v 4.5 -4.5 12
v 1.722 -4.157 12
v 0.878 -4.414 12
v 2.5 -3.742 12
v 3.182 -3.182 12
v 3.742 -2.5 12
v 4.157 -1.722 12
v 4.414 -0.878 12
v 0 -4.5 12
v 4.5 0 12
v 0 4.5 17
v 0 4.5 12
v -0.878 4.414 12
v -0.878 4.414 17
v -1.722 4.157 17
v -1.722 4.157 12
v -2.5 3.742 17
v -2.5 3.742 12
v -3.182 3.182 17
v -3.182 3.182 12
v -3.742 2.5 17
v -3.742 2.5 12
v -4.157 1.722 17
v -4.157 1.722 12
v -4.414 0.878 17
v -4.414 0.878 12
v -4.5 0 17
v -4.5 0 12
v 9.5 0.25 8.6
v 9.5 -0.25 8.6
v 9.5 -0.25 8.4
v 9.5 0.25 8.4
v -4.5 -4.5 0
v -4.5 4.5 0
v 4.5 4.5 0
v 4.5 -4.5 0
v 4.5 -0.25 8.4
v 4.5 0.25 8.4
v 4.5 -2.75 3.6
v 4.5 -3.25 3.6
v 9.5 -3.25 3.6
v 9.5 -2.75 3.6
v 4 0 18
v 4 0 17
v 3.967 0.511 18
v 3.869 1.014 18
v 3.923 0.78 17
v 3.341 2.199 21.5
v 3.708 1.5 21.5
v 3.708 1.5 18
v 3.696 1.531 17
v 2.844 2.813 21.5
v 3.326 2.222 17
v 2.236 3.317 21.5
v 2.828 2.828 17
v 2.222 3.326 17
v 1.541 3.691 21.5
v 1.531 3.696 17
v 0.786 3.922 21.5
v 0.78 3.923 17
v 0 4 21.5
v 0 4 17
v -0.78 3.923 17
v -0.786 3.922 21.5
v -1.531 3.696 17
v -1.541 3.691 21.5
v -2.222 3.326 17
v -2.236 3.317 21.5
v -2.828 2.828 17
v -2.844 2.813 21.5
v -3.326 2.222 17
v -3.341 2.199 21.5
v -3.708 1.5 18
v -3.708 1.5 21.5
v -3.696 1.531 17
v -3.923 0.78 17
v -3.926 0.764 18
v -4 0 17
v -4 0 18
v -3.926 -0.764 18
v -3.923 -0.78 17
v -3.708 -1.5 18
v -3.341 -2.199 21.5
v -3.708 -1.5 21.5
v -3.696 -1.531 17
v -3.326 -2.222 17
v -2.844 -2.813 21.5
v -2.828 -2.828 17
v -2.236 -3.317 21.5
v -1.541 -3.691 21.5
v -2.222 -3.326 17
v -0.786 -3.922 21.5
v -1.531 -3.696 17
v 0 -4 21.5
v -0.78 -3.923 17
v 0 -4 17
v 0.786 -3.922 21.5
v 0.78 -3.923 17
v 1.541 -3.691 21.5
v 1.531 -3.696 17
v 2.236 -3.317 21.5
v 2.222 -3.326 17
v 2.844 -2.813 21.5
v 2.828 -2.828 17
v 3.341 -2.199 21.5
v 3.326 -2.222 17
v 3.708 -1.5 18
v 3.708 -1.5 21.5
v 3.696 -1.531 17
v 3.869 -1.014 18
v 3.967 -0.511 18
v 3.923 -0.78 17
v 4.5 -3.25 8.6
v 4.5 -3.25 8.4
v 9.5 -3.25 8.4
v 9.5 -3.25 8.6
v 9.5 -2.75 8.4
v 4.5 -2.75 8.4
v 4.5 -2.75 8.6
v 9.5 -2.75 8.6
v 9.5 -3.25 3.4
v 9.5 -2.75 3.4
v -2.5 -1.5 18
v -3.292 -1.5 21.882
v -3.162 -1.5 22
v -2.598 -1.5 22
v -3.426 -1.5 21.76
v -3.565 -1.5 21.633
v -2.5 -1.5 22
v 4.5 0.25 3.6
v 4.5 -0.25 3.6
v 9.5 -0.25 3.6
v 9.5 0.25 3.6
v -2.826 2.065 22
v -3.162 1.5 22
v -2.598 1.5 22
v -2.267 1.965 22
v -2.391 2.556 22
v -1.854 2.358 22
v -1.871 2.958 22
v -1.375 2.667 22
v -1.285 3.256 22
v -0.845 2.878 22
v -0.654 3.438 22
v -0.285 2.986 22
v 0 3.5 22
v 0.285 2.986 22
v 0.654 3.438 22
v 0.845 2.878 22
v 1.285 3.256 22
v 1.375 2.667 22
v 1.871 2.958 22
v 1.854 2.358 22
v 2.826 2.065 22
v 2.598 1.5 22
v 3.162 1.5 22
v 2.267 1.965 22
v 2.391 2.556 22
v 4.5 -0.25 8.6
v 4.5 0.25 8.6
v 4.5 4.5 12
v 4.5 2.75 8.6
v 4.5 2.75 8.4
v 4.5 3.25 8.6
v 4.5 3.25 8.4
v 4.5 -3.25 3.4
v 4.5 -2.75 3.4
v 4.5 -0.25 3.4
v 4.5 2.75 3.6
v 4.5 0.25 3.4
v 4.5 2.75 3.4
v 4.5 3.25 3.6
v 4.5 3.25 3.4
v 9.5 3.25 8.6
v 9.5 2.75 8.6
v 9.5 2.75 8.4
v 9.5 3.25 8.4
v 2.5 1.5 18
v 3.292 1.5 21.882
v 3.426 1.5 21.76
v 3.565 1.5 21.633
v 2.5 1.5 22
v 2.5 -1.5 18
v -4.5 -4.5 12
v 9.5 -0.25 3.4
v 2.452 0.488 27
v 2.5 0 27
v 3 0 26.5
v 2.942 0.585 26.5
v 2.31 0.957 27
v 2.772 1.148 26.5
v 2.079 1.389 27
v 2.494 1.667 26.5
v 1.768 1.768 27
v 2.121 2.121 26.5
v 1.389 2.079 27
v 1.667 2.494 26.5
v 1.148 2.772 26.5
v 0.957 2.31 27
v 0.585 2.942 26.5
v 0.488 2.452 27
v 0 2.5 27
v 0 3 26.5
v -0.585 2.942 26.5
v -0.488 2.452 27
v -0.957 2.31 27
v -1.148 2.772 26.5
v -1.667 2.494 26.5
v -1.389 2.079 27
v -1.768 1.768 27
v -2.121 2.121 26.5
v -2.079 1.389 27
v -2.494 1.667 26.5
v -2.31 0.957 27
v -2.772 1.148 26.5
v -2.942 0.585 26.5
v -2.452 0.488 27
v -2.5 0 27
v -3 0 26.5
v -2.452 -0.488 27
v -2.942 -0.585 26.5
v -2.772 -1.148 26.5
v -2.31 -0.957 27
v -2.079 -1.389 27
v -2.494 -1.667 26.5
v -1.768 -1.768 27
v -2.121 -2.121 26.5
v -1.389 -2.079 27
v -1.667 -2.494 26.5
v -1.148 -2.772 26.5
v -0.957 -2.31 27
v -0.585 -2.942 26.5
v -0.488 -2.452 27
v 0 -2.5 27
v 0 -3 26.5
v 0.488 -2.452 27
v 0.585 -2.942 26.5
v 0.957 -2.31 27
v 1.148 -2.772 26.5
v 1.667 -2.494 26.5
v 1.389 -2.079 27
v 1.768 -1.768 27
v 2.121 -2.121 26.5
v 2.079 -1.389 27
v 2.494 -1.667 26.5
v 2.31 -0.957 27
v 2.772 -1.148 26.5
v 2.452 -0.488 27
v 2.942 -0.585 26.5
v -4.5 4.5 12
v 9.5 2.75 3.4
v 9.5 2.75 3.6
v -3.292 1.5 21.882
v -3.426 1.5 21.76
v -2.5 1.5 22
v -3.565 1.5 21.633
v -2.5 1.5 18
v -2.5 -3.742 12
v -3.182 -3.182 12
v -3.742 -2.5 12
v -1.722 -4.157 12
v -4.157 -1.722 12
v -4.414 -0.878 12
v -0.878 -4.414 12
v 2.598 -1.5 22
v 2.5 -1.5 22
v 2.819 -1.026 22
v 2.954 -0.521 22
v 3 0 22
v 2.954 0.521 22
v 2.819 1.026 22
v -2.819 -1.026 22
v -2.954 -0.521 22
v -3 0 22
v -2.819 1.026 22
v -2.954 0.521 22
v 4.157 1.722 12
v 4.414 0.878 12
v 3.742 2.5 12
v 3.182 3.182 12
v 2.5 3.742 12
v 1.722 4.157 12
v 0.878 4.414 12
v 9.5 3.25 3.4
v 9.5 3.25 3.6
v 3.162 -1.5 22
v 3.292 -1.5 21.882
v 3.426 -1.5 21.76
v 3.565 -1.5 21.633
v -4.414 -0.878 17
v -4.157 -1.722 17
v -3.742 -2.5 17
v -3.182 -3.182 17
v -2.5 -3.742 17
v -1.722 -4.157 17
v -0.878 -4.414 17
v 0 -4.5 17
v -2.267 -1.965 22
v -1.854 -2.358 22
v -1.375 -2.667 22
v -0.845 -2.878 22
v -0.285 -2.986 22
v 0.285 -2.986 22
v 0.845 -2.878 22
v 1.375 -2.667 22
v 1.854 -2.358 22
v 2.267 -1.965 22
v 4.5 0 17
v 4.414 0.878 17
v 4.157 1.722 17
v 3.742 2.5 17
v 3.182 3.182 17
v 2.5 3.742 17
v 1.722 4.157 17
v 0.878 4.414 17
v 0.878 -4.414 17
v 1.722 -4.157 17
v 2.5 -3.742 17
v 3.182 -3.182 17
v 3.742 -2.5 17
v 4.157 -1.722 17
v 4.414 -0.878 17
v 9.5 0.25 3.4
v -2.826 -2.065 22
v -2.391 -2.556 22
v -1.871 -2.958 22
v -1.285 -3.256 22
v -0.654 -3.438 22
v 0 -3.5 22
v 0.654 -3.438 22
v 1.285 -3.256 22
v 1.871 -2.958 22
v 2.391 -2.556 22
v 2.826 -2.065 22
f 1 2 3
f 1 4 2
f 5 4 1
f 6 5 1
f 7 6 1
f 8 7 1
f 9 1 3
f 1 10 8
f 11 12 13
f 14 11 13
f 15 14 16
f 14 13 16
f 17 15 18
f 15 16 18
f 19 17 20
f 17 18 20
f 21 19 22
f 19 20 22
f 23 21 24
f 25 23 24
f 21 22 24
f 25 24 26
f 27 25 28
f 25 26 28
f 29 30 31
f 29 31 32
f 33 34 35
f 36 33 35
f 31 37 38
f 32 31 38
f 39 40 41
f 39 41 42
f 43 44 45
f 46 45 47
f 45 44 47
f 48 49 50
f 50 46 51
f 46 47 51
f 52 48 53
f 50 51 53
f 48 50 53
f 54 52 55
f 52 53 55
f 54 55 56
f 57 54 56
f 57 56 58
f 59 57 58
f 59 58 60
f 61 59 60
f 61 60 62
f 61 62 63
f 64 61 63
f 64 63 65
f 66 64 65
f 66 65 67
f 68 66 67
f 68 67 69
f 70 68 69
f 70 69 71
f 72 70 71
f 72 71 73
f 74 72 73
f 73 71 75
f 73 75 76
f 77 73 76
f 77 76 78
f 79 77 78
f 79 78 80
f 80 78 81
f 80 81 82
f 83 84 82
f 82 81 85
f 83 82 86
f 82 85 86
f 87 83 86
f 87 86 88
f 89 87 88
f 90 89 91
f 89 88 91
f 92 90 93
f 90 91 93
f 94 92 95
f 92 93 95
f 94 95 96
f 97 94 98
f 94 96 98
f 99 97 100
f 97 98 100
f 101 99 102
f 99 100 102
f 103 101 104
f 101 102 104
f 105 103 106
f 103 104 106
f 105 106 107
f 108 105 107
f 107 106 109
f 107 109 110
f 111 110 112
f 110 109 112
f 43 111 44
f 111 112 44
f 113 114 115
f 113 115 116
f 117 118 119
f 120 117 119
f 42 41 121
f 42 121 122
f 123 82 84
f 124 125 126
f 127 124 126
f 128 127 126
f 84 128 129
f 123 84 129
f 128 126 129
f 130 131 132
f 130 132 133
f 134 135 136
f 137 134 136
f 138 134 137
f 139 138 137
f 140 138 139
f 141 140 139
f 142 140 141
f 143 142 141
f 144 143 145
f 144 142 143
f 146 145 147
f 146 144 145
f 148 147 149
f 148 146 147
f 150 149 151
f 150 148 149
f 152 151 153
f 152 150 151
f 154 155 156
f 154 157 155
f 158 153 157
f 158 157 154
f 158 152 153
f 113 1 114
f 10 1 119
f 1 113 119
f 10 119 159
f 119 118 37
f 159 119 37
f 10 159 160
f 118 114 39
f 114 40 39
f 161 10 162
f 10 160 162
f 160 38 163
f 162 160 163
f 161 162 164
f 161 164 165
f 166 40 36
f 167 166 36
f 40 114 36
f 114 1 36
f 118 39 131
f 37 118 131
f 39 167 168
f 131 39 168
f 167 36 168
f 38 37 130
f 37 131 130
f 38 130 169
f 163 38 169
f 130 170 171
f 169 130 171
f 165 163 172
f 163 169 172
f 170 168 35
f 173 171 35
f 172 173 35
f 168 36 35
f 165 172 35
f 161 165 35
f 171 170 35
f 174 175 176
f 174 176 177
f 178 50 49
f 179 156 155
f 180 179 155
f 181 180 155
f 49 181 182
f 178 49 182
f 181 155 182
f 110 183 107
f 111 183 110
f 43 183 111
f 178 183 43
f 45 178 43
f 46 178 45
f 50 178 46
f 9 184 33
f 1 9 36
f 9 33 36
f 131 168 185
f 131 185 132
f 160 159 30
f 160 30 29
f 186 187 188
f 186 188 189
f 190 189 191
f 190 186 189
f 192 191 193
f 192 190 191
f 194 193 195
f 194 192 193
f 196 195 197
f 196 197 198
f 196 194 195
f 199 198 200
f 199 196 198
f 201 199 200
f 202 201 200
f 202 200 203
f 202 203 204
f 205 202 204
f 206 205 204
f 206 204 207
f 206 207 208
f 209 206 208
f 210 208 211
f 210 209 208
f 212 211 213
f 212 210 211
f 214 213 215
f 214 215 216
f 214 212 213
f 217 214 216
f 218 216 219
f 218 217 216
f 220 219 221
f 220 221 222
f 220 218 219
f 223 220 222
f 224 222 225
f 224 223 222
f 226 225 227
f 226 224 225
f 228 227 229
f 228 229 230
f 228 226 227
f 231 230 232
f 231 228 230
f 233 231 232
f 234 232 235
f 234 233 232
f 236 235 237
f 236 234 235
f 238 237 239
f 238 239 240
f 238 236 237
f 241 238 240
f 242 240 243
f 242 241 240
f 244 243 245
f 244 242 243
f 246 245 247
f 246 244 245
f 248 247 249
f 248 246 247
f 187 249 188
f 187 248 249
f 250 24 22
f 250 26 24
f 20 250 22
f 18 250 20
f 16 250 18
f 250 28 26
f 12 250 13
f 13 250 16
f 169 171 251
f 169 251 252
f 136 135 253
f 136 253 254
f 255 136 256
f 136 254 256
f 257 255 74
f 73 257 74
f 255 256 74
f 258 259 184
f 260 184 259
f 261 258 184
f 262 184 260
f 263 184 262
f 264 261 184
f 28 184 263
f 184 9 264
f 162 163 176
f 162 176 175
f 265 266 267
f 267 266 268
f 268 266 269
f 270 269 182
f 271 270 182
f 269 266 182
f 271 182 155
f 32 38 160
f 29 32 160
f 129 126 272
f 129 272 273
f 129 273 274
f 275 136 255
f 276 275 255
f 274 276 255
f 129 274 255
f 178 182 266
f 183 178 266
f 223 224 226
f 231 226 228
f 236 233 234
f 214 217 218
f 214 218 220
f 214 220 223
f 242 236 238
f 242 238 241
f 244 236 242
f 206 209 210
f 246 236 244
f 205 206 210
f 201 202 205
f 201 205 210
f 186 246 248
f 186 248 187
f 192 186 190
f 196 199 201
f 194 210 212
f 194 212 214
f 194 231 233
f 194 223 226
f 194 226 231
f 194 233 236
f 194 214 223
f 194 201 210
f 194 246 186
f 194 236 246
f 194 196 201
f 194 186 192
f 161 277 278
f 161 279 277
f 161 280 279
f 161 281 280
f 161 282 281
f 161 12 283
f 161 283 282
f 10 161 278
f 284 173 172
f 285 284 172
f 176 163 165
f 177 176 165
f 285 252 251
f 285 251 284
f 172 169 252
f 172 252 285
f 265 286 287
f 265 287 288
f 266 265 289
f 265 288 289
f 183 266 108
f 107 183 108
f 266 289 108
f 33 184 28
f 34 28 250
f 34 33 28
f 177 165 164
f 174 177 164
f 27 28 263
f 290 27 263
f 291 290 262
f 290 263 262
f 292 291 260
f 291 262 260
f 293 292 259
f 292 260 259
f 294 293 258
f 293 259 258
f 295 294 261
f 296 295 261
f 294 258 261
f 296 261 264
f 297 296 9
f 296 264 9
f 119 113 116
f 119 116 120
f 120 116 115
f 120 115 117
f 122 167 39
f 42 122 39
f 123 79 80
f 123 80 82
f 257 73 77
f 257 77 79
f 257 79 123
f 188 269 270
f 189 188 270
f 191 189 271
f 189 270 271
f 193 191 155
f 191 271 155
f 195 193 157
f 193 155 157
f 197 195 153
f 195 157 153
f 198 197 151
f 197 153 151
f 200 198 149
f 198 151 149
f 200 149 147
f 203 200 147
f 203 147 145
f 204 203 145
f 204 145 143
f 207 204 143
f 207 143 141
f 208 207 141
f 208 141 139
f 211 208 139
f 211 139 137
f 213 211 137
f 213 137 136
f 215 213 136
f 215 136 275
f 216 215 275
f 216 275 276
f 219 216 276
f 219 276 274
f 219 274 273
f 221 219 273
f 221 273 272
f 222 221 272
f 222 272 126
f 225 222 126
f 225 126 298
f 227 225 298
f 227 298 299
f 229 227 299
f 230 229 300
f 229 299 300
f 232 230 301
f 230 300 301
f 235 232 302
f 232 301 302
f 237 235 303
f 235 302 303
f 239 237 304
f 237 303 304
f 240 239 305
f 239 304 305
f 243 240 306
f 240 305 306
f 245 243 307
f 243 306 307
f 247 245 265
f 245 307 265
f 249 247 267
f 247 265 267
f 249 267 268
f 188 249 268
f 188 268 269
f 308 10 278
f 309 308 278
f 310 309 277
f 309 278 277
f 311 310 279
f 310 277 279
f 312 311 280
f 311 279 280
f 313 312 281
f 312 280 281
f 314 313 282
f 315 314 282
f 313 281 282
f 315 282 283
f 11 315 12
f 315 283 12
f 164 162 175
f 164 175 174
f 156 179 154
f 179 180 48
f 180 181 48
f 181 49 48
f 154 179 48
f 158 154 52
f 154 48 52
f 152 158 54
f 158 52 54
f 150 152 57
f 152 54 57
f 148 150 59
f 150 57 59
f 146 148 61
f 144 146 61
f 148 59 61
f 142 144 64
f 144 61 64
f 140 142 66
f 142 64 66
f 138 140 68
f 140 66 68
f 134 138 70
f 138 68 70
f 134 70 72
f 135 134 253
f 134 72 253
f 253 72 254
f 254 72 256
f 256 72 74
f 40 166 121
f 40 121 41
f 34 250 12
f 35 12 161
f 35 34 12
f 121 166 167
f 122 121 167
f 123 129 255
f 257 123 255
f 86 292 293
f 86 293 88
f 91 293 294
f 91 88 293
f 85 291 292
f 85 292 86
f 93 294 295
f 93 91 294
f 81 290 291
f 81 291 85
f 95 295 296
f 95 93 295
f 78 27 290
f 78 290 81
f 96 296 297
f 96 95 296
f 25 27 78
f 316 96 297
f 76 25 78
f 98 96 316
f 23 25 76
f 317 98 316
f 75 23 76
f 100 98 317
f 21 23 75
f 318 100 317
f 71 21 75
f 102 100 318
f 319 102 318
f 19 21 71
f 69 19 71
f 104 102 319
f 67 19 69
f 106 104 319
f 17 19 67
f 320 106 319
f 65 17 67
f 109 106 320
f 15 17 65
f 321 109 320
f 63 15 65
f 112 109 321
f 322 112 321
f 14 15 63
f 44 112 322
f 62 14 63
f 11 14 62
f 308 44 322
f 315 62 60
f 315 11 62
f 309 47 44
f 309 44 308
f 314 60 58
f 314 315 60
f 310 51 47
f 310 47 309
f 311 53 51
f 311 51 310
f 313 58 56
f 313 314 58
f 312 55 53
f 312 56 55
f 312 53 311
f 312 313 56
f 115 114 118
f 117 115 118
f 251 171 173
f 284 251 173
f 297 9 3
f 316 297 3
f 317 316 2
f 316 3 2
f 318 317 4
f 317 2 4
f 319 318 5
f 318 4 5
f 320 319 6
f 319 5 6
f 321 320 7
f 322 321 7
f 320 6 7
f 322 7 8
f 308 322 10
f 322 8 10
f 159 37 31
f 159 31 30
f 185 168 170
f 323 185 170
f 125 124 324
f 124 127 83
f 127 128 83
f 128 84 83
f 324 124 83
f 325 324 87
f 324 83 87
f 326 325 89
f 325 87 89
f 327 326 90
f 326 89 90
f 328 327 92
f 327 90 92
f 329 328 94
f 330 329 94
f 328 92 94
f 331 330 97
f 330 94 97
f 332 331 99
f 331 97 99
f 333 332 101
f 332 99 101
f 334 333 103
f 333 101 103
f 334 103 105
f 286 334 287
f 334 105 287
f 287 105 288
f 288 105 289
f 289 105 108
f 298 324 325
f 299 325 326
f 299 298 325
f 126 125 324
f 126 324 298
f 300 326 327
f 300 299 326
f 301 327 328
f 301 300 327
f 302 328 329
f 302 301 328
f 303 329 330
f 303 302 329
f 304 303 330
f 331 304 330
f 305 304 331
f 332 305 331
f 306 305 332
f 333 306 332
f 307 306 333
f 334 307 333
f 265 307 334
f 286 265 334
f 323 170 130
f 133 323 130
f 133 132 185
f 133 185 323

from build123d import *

# Parameters (mm, degrees)
F0_W      = 9
F0_H      = 9
F1_DEPTH  = 12
F3_DEPTH  = 5
F4_R      = 4
F5_DEPTH  = 5
F7_DEPTH  = 4
F8_R      = 3
F9_DEPTH  = 5
F10_W     = 0.5
F10_H     = 0.2
F11_DEPTH = 5
F12_SIZE  = 0.5


with BuildPart() as f1:
    # F0 (on Top) → F1 (new body)
    with BuildSketch(Plane.XY):
        Rectangle(F0_W, F0_H)
    extrude(amount=F1_DEPTH)

    # F2 (on face) → F3 (join)
    with BuildSketch(Plane.XY.offset(12)):
        with BuildLine():
            ThreePointArc((0, -4.5), (3.1819805153, -3.1819805153), (4.5, 0))
            ThreePointArc((4.5, 0), (3.1819805153, 3.1819805153), (0, 4.5))
            ThreePointArc((0, 4.5), (-3.1819805153, 3.1819805153), (-4.5, 0))
            ThreePointArc((-4.5, 0), (-3.1819805153, -3.1819805153), (0, -4.5))
        make_face()
    extrude(amount=F3_DEPTH)

    # F4 (on face) → F5 (join)
    with BuildSketch(Plane.XY.offset(17)):
        Circle(F4_R)
    extrude(amount=F5_DEPTH)

    # F6 (on face) → F7 (cut)
    with BuildSketch(Plane.XY.offset(22)):
        with BuildLine():
            Line((-2.5, 1.5), (-3.7080992435, 1.5))
            ThreePointArc((-3.7080992435, 1.5), (-4, 0), (-3.7080992435, -1.5))
            Line((-3.7080992435, -1.5), (-2.5, -1.5))
            Line((-2.5, -1.5), (-2.5, 1.5))
        make_face()
        with BuildLine():
            ThreePointArc((3.7080992435, -1.5), (3.92634671, -0.7640690498), (4, 0))
            ThreePointArc((4, 0), (3.92634671, 0.7640690498), (3.7080992435, 1.5))
            Line((3.7080992435, 1.5), (2.5, 1.5))
            Line((2.5, 1.5), (2.5, -1.5))
            Line((2.5, -1.5), (3.7080992435, -1.5))
        make_face()
    extrude(amount=-F7_DEPTH, mode=Mode.SUBTRACT)

    # F8 (on face) → F9 (join)
    with BuildSketch(Plane.XY.offset(22)):
        Circle(F8_R)
    extrude(amount=F9_DEPTH)

    # F10 (on face) → F11 (join)
    with BuildSketch(Plane.YZ.offset(4.5)):
        with Locations((-3, 8.5)):
            Rectangle(F10_W, F10_H)
        with Locations((0, 8.5)):
            Rectangle(F10_W, F10_H)
        with Locations((3, 8.5)):
            Rectangle(F10_W, F10_H)
        with Locations((-3, 3.5)):
            Rectangle(F10_W, F10_H)
        with Locations((0, 3.5)):
            Rectangle(F10_W, F10_H)
        with Locations((3, 3.5)):
            Rectangle(F10_W, F10_H)
    extrude(amount=F11_DEPTH)

    # F12
    f12_edges = [f1.edges().sort_by_distance(p)[0] for p in [
        (-3, 0, 27),
        (0, 4, 22),
        (0, -4, 22),
    ]]
    chamfer(f12_edges, length=F12_SIZE)


solid = f1.part
